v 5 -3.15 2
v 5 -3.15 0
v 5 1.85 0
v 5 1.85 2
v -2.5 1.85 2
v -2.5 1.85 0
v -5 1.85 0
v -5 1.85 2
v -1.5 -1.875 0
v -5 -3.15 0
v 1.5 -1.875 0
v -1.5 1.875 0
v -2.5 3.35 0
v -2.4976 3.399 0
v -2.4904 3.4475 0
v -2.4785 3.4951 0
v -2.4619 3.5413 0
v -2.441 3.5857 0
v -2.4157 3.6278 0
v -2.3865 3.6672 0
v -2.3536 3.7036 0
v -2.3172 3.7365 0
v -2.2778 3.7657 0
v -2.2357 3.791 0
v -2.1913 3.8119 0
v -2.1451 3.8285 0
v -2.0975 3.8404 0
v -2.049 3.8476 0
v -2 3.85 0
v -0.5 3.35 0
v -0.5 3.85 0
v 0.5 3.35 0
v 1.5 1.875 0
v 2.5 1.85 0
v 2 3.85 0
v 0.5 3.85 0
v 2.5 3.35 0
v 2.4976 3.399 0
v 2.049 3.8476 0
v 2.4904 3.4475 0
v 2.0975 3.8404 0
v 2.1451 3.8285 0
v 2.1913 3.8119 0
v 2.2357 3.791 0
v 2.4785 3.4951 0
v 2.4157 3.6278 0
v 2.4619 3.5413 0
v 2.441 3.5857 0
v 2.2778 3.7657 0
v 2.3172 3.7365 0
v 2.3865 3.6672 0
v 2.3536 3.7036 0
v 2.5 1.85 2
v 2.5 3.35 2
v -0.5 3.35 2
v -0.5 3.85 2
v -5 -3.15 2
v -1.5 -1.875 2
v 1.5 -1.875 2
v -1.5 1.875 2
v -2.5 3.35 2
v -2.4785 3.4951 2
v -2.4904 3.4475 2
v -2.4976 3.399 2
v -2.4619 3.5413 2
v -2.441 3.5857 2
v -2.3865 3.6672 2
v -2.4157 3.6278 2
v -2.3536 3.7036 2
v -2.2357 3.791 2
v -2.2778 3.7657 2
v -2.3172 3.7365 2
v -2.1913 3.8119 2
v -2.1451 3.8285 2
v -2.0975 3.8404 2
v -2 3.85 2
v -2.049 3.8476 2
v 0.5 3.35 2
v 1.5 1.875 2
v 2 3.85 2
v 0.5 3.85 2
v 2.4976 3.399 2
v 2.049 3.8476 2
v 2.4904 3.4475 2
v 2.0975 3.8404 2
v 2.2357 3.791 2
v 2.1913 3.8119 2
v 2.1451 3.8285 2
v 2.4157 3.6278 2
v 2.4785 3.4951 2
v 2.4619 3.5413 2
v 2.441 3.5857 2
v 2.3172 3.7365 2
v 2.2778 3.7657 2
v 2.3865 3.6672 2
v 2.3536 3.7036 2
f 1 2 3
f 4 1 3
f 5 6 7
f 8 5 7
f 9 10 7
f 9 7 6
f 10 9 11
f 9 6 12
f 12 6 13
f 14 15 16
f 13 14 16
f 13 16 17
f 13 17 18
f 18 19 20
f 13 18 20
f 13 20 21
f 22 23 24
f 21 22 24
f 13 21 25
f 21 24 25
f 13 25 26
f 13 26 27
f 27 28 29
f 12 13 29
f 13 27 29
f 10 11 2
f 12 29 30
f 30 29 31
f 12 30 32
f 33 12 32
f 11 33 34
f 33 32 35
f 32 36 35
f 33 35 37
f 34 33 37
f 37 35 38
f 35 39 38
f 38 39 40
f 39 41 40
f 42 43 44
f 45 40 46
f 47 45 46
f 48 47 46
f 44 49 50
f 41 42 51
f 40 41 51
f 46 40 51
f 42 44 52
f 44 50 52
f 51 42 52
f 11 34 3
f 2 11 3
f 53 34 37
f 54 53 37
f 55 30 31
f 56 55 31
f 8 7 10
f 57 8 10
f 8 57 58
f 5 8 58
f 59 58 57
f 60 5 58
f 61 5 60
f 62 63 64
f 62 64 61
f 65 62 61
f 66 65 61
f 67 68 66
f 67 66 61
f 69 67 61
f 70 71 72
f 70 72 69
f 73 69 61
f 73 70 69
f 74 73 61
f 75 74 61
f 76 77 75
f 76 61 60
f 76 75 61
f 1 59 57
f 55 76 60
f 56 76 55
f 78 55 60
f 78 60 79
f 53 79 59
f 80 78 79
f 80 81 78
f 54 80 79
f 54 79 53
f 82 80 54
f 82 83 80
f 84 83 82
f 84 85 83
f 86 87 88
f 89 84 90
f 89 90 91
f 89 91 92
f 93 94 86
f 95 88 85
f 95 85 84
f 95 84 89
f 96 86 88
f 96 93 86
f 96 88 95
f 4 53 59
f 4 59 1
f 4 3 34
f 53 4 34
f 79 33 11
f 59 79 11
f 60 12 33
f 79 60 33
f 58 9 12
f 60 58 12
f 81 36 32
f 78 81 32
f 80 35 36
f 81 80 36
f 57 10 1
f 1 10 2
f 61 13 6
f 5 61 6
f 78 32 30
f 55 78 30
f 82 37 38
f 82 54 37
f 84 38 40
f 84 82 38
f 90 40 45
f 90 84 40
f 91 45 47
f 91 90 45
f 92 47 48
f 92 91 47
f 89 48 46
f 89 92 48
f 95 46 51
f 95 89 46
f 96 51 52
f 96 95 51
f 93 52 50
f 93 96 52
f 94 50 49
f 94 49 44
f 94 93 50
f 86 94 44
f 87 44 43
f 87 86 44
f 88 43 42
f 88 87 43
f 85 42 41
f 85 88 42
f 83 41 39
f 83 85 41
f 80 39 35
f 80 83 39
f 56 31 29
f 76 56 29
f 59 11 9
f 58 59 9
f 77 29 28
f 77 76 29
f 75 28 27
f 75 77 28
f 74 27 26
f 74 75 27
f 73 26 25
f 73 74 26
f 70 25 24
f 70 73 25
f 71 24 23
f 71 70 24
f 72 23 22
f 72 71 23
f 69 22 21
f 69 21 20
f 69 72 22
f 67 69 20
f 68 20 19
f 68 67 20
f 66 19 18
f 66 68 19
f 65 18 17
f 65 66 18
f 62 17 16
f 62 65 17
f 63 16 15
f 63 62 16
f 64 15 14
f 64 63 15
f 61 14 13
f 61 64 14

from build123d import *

# Parameters (mm, degrees)
F1_DEPTH = 2
F2_R     = 0.5


with BuildPart() as f1:
    # F0 (on Top) → F1 (new body)
    with BuildSketch(Plane.XY):
        Polygon((1.5, 1.875), (1.5, 1.85), (2.5, 1.85), (2.5, 3.85), (0.5, 3.85), (0.5, 3.35), (-0.5, 3.35), (-0.5, 3.85), (-2.5, 3.85), (-2.5, 1.85), (-1.5, 1.85), (-1.5, 1.875), align=None)
        Polygon((1.5, 1.85), (1.5, -1.875), (-1.5, -1.875), (-1.5, 1.85), (-2.5, 1.85), (-5, 1.85), (-5, -3.15), (5, -3.15), (5, 1.85), (2.5, 1.85), align=None)
    extrude(amount=F1_DEPTH)

    # F2
    f2_edges = [f1.edges().sort_by_distance(p)[0] for p in [
        (-2.5, 3.85, 1),
        (2.5, 3.85, 1),
    ]]
    fillet(f2_edges, radius=F2_R)


solid = f1.part
